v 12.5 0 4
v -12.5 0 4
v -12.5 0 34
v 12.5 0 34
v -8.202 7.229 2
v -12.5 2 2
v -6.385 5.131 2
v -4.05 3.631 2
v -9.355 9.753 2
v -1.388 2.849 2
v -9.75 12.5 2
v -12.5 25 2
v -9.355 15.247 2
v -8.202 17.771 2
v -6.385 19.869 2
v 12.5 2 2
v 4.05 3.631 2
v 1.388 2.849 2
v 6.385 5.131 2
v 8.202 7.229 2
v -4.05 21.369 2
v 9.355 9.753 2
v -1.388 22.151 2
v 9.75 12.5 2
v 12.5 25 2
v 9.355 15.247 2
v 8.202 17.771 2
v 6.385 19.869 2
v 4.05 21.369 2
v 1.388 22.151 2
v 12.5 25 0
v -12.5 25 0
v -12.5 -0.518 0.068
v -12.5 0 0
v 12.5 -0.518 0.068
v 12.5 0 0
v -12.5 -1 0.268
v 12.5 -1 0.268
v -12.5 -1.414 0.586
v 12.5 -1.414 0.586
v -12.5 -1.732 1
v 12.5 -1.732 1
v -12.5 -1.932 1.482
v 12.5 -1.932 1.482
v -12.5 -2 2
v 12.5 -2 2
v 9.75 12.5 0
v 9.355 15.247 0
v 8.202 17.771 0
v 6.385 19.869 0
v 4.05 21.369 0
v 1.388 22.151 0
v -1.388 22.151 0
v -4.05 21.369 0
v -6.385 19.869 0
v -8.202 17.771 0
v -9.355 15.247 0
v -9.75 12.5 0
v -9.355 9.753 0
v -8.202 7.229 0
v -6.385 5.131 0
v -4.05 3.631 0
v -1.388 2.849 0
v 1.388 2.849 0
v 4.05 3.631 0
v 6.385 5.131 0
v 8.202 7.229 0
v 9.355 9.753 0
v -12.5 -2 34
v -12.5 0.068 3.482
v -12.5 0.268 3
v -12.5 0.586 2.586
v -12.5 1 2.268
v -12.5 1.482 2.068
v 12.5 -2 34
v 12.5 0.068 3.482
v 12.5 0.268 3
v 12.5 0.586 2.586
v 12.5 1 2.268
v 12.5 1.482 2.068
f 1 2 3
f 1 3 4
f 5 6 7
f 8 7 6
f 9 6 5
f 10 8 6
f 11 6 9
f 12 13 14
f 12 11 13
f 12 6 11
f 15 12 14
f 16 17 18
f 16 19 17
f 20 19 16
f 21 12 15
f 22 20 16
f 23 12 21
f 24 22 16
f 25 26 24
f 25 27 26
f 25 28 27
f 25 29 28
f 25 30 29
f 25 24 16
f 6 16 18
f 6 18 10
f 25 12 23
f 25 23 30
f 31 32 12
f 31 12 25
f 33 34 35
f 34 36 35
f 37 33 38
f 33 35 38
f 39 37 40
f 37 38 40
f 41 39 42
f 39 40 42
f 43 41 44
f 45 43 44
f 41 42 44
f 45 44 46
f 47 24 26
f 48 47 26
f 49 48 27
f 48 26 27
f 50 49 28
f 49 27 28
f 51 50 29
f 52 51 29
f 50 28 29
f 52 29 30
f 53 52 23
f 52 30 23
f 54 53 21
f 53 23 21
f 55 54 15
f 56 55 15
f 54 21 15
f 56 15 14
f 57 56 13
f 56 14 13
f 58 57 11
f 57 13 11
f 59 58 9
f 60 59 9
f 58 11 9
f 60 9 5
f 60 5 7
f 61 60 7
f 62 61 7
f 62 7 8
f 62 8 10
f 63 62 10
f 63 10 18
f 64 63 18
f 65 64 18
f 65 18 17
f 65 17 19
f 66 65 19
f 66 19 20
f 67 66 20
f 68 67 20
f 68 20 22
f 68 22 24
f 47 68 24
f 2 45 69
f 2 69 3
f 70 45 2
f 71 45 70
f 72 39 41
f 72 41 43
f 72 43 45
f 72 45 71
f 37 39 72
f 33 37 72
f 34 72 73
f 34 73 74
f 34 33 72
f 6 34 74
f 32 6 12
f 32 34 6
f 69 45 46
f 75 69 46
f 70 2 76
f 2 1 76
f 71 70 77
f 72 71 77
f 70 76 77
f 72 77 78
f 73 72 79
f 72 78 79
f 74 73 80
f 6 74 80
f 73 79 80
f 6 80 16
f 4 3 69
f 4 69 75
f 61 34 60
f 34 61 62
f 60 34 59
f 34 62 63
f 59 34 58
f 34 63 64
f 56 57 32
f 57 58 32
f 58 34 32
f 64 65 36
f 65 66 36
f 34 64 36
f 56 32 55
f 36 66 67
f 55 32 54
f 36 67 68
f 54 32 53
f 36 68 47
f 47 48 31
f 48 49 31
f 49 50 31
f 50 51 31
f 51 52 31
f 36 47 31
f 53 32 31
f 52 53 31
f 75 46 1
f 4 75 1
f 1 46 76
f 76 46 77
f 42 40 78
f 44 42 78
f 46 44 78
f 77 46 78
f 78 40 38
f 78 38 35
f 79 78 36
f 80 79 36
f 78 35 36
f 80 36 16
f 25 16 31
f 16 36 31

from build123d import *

# Parameters (mm, degrees)
F0_W     = 25
F0_H     = 34
F1_DEPTH = 2
F2_W     = 25
F2_H     = 25
F3_DEPTH = 2
F4_R     = 9.75
F5_DEPTH = 2.001
F6_R     = 2


with BuildPart() as f1:
    # F0 (on Front) → F1 (new body)
    with BuildSketch(Plane.XZ):
        with Locations((0, 17)):
            Rectangle(F0_W, F0_H)
    extrude(amount=F1_DEPTH)

    # F2 (on Top) → F3 (join)
    with BuildSketch(Plane.XY):
        with Locations((0, 12.5)):
            Rectangle(F2_W, F2_H)
    extrude(amount=F3_DEPTH)

    # F4 (on face) → F5 (cut, through all)
    with BuildSketch(Plane.XY.offset(2)):
        with Locations((0, 12.5)):
            Circle(F4_R)
    extrude(amount=-F5_DEPTH, mode=Mode.SUBTRACT)

    # F6
    f6_edges = [f1.edges().sort_by_distance(p)[0] for p in [
        (0, -2, 0),
        (0, 0, 2),
    ]]
    fillet(f6_edges, radius=F6_R)


solid = f1.part
